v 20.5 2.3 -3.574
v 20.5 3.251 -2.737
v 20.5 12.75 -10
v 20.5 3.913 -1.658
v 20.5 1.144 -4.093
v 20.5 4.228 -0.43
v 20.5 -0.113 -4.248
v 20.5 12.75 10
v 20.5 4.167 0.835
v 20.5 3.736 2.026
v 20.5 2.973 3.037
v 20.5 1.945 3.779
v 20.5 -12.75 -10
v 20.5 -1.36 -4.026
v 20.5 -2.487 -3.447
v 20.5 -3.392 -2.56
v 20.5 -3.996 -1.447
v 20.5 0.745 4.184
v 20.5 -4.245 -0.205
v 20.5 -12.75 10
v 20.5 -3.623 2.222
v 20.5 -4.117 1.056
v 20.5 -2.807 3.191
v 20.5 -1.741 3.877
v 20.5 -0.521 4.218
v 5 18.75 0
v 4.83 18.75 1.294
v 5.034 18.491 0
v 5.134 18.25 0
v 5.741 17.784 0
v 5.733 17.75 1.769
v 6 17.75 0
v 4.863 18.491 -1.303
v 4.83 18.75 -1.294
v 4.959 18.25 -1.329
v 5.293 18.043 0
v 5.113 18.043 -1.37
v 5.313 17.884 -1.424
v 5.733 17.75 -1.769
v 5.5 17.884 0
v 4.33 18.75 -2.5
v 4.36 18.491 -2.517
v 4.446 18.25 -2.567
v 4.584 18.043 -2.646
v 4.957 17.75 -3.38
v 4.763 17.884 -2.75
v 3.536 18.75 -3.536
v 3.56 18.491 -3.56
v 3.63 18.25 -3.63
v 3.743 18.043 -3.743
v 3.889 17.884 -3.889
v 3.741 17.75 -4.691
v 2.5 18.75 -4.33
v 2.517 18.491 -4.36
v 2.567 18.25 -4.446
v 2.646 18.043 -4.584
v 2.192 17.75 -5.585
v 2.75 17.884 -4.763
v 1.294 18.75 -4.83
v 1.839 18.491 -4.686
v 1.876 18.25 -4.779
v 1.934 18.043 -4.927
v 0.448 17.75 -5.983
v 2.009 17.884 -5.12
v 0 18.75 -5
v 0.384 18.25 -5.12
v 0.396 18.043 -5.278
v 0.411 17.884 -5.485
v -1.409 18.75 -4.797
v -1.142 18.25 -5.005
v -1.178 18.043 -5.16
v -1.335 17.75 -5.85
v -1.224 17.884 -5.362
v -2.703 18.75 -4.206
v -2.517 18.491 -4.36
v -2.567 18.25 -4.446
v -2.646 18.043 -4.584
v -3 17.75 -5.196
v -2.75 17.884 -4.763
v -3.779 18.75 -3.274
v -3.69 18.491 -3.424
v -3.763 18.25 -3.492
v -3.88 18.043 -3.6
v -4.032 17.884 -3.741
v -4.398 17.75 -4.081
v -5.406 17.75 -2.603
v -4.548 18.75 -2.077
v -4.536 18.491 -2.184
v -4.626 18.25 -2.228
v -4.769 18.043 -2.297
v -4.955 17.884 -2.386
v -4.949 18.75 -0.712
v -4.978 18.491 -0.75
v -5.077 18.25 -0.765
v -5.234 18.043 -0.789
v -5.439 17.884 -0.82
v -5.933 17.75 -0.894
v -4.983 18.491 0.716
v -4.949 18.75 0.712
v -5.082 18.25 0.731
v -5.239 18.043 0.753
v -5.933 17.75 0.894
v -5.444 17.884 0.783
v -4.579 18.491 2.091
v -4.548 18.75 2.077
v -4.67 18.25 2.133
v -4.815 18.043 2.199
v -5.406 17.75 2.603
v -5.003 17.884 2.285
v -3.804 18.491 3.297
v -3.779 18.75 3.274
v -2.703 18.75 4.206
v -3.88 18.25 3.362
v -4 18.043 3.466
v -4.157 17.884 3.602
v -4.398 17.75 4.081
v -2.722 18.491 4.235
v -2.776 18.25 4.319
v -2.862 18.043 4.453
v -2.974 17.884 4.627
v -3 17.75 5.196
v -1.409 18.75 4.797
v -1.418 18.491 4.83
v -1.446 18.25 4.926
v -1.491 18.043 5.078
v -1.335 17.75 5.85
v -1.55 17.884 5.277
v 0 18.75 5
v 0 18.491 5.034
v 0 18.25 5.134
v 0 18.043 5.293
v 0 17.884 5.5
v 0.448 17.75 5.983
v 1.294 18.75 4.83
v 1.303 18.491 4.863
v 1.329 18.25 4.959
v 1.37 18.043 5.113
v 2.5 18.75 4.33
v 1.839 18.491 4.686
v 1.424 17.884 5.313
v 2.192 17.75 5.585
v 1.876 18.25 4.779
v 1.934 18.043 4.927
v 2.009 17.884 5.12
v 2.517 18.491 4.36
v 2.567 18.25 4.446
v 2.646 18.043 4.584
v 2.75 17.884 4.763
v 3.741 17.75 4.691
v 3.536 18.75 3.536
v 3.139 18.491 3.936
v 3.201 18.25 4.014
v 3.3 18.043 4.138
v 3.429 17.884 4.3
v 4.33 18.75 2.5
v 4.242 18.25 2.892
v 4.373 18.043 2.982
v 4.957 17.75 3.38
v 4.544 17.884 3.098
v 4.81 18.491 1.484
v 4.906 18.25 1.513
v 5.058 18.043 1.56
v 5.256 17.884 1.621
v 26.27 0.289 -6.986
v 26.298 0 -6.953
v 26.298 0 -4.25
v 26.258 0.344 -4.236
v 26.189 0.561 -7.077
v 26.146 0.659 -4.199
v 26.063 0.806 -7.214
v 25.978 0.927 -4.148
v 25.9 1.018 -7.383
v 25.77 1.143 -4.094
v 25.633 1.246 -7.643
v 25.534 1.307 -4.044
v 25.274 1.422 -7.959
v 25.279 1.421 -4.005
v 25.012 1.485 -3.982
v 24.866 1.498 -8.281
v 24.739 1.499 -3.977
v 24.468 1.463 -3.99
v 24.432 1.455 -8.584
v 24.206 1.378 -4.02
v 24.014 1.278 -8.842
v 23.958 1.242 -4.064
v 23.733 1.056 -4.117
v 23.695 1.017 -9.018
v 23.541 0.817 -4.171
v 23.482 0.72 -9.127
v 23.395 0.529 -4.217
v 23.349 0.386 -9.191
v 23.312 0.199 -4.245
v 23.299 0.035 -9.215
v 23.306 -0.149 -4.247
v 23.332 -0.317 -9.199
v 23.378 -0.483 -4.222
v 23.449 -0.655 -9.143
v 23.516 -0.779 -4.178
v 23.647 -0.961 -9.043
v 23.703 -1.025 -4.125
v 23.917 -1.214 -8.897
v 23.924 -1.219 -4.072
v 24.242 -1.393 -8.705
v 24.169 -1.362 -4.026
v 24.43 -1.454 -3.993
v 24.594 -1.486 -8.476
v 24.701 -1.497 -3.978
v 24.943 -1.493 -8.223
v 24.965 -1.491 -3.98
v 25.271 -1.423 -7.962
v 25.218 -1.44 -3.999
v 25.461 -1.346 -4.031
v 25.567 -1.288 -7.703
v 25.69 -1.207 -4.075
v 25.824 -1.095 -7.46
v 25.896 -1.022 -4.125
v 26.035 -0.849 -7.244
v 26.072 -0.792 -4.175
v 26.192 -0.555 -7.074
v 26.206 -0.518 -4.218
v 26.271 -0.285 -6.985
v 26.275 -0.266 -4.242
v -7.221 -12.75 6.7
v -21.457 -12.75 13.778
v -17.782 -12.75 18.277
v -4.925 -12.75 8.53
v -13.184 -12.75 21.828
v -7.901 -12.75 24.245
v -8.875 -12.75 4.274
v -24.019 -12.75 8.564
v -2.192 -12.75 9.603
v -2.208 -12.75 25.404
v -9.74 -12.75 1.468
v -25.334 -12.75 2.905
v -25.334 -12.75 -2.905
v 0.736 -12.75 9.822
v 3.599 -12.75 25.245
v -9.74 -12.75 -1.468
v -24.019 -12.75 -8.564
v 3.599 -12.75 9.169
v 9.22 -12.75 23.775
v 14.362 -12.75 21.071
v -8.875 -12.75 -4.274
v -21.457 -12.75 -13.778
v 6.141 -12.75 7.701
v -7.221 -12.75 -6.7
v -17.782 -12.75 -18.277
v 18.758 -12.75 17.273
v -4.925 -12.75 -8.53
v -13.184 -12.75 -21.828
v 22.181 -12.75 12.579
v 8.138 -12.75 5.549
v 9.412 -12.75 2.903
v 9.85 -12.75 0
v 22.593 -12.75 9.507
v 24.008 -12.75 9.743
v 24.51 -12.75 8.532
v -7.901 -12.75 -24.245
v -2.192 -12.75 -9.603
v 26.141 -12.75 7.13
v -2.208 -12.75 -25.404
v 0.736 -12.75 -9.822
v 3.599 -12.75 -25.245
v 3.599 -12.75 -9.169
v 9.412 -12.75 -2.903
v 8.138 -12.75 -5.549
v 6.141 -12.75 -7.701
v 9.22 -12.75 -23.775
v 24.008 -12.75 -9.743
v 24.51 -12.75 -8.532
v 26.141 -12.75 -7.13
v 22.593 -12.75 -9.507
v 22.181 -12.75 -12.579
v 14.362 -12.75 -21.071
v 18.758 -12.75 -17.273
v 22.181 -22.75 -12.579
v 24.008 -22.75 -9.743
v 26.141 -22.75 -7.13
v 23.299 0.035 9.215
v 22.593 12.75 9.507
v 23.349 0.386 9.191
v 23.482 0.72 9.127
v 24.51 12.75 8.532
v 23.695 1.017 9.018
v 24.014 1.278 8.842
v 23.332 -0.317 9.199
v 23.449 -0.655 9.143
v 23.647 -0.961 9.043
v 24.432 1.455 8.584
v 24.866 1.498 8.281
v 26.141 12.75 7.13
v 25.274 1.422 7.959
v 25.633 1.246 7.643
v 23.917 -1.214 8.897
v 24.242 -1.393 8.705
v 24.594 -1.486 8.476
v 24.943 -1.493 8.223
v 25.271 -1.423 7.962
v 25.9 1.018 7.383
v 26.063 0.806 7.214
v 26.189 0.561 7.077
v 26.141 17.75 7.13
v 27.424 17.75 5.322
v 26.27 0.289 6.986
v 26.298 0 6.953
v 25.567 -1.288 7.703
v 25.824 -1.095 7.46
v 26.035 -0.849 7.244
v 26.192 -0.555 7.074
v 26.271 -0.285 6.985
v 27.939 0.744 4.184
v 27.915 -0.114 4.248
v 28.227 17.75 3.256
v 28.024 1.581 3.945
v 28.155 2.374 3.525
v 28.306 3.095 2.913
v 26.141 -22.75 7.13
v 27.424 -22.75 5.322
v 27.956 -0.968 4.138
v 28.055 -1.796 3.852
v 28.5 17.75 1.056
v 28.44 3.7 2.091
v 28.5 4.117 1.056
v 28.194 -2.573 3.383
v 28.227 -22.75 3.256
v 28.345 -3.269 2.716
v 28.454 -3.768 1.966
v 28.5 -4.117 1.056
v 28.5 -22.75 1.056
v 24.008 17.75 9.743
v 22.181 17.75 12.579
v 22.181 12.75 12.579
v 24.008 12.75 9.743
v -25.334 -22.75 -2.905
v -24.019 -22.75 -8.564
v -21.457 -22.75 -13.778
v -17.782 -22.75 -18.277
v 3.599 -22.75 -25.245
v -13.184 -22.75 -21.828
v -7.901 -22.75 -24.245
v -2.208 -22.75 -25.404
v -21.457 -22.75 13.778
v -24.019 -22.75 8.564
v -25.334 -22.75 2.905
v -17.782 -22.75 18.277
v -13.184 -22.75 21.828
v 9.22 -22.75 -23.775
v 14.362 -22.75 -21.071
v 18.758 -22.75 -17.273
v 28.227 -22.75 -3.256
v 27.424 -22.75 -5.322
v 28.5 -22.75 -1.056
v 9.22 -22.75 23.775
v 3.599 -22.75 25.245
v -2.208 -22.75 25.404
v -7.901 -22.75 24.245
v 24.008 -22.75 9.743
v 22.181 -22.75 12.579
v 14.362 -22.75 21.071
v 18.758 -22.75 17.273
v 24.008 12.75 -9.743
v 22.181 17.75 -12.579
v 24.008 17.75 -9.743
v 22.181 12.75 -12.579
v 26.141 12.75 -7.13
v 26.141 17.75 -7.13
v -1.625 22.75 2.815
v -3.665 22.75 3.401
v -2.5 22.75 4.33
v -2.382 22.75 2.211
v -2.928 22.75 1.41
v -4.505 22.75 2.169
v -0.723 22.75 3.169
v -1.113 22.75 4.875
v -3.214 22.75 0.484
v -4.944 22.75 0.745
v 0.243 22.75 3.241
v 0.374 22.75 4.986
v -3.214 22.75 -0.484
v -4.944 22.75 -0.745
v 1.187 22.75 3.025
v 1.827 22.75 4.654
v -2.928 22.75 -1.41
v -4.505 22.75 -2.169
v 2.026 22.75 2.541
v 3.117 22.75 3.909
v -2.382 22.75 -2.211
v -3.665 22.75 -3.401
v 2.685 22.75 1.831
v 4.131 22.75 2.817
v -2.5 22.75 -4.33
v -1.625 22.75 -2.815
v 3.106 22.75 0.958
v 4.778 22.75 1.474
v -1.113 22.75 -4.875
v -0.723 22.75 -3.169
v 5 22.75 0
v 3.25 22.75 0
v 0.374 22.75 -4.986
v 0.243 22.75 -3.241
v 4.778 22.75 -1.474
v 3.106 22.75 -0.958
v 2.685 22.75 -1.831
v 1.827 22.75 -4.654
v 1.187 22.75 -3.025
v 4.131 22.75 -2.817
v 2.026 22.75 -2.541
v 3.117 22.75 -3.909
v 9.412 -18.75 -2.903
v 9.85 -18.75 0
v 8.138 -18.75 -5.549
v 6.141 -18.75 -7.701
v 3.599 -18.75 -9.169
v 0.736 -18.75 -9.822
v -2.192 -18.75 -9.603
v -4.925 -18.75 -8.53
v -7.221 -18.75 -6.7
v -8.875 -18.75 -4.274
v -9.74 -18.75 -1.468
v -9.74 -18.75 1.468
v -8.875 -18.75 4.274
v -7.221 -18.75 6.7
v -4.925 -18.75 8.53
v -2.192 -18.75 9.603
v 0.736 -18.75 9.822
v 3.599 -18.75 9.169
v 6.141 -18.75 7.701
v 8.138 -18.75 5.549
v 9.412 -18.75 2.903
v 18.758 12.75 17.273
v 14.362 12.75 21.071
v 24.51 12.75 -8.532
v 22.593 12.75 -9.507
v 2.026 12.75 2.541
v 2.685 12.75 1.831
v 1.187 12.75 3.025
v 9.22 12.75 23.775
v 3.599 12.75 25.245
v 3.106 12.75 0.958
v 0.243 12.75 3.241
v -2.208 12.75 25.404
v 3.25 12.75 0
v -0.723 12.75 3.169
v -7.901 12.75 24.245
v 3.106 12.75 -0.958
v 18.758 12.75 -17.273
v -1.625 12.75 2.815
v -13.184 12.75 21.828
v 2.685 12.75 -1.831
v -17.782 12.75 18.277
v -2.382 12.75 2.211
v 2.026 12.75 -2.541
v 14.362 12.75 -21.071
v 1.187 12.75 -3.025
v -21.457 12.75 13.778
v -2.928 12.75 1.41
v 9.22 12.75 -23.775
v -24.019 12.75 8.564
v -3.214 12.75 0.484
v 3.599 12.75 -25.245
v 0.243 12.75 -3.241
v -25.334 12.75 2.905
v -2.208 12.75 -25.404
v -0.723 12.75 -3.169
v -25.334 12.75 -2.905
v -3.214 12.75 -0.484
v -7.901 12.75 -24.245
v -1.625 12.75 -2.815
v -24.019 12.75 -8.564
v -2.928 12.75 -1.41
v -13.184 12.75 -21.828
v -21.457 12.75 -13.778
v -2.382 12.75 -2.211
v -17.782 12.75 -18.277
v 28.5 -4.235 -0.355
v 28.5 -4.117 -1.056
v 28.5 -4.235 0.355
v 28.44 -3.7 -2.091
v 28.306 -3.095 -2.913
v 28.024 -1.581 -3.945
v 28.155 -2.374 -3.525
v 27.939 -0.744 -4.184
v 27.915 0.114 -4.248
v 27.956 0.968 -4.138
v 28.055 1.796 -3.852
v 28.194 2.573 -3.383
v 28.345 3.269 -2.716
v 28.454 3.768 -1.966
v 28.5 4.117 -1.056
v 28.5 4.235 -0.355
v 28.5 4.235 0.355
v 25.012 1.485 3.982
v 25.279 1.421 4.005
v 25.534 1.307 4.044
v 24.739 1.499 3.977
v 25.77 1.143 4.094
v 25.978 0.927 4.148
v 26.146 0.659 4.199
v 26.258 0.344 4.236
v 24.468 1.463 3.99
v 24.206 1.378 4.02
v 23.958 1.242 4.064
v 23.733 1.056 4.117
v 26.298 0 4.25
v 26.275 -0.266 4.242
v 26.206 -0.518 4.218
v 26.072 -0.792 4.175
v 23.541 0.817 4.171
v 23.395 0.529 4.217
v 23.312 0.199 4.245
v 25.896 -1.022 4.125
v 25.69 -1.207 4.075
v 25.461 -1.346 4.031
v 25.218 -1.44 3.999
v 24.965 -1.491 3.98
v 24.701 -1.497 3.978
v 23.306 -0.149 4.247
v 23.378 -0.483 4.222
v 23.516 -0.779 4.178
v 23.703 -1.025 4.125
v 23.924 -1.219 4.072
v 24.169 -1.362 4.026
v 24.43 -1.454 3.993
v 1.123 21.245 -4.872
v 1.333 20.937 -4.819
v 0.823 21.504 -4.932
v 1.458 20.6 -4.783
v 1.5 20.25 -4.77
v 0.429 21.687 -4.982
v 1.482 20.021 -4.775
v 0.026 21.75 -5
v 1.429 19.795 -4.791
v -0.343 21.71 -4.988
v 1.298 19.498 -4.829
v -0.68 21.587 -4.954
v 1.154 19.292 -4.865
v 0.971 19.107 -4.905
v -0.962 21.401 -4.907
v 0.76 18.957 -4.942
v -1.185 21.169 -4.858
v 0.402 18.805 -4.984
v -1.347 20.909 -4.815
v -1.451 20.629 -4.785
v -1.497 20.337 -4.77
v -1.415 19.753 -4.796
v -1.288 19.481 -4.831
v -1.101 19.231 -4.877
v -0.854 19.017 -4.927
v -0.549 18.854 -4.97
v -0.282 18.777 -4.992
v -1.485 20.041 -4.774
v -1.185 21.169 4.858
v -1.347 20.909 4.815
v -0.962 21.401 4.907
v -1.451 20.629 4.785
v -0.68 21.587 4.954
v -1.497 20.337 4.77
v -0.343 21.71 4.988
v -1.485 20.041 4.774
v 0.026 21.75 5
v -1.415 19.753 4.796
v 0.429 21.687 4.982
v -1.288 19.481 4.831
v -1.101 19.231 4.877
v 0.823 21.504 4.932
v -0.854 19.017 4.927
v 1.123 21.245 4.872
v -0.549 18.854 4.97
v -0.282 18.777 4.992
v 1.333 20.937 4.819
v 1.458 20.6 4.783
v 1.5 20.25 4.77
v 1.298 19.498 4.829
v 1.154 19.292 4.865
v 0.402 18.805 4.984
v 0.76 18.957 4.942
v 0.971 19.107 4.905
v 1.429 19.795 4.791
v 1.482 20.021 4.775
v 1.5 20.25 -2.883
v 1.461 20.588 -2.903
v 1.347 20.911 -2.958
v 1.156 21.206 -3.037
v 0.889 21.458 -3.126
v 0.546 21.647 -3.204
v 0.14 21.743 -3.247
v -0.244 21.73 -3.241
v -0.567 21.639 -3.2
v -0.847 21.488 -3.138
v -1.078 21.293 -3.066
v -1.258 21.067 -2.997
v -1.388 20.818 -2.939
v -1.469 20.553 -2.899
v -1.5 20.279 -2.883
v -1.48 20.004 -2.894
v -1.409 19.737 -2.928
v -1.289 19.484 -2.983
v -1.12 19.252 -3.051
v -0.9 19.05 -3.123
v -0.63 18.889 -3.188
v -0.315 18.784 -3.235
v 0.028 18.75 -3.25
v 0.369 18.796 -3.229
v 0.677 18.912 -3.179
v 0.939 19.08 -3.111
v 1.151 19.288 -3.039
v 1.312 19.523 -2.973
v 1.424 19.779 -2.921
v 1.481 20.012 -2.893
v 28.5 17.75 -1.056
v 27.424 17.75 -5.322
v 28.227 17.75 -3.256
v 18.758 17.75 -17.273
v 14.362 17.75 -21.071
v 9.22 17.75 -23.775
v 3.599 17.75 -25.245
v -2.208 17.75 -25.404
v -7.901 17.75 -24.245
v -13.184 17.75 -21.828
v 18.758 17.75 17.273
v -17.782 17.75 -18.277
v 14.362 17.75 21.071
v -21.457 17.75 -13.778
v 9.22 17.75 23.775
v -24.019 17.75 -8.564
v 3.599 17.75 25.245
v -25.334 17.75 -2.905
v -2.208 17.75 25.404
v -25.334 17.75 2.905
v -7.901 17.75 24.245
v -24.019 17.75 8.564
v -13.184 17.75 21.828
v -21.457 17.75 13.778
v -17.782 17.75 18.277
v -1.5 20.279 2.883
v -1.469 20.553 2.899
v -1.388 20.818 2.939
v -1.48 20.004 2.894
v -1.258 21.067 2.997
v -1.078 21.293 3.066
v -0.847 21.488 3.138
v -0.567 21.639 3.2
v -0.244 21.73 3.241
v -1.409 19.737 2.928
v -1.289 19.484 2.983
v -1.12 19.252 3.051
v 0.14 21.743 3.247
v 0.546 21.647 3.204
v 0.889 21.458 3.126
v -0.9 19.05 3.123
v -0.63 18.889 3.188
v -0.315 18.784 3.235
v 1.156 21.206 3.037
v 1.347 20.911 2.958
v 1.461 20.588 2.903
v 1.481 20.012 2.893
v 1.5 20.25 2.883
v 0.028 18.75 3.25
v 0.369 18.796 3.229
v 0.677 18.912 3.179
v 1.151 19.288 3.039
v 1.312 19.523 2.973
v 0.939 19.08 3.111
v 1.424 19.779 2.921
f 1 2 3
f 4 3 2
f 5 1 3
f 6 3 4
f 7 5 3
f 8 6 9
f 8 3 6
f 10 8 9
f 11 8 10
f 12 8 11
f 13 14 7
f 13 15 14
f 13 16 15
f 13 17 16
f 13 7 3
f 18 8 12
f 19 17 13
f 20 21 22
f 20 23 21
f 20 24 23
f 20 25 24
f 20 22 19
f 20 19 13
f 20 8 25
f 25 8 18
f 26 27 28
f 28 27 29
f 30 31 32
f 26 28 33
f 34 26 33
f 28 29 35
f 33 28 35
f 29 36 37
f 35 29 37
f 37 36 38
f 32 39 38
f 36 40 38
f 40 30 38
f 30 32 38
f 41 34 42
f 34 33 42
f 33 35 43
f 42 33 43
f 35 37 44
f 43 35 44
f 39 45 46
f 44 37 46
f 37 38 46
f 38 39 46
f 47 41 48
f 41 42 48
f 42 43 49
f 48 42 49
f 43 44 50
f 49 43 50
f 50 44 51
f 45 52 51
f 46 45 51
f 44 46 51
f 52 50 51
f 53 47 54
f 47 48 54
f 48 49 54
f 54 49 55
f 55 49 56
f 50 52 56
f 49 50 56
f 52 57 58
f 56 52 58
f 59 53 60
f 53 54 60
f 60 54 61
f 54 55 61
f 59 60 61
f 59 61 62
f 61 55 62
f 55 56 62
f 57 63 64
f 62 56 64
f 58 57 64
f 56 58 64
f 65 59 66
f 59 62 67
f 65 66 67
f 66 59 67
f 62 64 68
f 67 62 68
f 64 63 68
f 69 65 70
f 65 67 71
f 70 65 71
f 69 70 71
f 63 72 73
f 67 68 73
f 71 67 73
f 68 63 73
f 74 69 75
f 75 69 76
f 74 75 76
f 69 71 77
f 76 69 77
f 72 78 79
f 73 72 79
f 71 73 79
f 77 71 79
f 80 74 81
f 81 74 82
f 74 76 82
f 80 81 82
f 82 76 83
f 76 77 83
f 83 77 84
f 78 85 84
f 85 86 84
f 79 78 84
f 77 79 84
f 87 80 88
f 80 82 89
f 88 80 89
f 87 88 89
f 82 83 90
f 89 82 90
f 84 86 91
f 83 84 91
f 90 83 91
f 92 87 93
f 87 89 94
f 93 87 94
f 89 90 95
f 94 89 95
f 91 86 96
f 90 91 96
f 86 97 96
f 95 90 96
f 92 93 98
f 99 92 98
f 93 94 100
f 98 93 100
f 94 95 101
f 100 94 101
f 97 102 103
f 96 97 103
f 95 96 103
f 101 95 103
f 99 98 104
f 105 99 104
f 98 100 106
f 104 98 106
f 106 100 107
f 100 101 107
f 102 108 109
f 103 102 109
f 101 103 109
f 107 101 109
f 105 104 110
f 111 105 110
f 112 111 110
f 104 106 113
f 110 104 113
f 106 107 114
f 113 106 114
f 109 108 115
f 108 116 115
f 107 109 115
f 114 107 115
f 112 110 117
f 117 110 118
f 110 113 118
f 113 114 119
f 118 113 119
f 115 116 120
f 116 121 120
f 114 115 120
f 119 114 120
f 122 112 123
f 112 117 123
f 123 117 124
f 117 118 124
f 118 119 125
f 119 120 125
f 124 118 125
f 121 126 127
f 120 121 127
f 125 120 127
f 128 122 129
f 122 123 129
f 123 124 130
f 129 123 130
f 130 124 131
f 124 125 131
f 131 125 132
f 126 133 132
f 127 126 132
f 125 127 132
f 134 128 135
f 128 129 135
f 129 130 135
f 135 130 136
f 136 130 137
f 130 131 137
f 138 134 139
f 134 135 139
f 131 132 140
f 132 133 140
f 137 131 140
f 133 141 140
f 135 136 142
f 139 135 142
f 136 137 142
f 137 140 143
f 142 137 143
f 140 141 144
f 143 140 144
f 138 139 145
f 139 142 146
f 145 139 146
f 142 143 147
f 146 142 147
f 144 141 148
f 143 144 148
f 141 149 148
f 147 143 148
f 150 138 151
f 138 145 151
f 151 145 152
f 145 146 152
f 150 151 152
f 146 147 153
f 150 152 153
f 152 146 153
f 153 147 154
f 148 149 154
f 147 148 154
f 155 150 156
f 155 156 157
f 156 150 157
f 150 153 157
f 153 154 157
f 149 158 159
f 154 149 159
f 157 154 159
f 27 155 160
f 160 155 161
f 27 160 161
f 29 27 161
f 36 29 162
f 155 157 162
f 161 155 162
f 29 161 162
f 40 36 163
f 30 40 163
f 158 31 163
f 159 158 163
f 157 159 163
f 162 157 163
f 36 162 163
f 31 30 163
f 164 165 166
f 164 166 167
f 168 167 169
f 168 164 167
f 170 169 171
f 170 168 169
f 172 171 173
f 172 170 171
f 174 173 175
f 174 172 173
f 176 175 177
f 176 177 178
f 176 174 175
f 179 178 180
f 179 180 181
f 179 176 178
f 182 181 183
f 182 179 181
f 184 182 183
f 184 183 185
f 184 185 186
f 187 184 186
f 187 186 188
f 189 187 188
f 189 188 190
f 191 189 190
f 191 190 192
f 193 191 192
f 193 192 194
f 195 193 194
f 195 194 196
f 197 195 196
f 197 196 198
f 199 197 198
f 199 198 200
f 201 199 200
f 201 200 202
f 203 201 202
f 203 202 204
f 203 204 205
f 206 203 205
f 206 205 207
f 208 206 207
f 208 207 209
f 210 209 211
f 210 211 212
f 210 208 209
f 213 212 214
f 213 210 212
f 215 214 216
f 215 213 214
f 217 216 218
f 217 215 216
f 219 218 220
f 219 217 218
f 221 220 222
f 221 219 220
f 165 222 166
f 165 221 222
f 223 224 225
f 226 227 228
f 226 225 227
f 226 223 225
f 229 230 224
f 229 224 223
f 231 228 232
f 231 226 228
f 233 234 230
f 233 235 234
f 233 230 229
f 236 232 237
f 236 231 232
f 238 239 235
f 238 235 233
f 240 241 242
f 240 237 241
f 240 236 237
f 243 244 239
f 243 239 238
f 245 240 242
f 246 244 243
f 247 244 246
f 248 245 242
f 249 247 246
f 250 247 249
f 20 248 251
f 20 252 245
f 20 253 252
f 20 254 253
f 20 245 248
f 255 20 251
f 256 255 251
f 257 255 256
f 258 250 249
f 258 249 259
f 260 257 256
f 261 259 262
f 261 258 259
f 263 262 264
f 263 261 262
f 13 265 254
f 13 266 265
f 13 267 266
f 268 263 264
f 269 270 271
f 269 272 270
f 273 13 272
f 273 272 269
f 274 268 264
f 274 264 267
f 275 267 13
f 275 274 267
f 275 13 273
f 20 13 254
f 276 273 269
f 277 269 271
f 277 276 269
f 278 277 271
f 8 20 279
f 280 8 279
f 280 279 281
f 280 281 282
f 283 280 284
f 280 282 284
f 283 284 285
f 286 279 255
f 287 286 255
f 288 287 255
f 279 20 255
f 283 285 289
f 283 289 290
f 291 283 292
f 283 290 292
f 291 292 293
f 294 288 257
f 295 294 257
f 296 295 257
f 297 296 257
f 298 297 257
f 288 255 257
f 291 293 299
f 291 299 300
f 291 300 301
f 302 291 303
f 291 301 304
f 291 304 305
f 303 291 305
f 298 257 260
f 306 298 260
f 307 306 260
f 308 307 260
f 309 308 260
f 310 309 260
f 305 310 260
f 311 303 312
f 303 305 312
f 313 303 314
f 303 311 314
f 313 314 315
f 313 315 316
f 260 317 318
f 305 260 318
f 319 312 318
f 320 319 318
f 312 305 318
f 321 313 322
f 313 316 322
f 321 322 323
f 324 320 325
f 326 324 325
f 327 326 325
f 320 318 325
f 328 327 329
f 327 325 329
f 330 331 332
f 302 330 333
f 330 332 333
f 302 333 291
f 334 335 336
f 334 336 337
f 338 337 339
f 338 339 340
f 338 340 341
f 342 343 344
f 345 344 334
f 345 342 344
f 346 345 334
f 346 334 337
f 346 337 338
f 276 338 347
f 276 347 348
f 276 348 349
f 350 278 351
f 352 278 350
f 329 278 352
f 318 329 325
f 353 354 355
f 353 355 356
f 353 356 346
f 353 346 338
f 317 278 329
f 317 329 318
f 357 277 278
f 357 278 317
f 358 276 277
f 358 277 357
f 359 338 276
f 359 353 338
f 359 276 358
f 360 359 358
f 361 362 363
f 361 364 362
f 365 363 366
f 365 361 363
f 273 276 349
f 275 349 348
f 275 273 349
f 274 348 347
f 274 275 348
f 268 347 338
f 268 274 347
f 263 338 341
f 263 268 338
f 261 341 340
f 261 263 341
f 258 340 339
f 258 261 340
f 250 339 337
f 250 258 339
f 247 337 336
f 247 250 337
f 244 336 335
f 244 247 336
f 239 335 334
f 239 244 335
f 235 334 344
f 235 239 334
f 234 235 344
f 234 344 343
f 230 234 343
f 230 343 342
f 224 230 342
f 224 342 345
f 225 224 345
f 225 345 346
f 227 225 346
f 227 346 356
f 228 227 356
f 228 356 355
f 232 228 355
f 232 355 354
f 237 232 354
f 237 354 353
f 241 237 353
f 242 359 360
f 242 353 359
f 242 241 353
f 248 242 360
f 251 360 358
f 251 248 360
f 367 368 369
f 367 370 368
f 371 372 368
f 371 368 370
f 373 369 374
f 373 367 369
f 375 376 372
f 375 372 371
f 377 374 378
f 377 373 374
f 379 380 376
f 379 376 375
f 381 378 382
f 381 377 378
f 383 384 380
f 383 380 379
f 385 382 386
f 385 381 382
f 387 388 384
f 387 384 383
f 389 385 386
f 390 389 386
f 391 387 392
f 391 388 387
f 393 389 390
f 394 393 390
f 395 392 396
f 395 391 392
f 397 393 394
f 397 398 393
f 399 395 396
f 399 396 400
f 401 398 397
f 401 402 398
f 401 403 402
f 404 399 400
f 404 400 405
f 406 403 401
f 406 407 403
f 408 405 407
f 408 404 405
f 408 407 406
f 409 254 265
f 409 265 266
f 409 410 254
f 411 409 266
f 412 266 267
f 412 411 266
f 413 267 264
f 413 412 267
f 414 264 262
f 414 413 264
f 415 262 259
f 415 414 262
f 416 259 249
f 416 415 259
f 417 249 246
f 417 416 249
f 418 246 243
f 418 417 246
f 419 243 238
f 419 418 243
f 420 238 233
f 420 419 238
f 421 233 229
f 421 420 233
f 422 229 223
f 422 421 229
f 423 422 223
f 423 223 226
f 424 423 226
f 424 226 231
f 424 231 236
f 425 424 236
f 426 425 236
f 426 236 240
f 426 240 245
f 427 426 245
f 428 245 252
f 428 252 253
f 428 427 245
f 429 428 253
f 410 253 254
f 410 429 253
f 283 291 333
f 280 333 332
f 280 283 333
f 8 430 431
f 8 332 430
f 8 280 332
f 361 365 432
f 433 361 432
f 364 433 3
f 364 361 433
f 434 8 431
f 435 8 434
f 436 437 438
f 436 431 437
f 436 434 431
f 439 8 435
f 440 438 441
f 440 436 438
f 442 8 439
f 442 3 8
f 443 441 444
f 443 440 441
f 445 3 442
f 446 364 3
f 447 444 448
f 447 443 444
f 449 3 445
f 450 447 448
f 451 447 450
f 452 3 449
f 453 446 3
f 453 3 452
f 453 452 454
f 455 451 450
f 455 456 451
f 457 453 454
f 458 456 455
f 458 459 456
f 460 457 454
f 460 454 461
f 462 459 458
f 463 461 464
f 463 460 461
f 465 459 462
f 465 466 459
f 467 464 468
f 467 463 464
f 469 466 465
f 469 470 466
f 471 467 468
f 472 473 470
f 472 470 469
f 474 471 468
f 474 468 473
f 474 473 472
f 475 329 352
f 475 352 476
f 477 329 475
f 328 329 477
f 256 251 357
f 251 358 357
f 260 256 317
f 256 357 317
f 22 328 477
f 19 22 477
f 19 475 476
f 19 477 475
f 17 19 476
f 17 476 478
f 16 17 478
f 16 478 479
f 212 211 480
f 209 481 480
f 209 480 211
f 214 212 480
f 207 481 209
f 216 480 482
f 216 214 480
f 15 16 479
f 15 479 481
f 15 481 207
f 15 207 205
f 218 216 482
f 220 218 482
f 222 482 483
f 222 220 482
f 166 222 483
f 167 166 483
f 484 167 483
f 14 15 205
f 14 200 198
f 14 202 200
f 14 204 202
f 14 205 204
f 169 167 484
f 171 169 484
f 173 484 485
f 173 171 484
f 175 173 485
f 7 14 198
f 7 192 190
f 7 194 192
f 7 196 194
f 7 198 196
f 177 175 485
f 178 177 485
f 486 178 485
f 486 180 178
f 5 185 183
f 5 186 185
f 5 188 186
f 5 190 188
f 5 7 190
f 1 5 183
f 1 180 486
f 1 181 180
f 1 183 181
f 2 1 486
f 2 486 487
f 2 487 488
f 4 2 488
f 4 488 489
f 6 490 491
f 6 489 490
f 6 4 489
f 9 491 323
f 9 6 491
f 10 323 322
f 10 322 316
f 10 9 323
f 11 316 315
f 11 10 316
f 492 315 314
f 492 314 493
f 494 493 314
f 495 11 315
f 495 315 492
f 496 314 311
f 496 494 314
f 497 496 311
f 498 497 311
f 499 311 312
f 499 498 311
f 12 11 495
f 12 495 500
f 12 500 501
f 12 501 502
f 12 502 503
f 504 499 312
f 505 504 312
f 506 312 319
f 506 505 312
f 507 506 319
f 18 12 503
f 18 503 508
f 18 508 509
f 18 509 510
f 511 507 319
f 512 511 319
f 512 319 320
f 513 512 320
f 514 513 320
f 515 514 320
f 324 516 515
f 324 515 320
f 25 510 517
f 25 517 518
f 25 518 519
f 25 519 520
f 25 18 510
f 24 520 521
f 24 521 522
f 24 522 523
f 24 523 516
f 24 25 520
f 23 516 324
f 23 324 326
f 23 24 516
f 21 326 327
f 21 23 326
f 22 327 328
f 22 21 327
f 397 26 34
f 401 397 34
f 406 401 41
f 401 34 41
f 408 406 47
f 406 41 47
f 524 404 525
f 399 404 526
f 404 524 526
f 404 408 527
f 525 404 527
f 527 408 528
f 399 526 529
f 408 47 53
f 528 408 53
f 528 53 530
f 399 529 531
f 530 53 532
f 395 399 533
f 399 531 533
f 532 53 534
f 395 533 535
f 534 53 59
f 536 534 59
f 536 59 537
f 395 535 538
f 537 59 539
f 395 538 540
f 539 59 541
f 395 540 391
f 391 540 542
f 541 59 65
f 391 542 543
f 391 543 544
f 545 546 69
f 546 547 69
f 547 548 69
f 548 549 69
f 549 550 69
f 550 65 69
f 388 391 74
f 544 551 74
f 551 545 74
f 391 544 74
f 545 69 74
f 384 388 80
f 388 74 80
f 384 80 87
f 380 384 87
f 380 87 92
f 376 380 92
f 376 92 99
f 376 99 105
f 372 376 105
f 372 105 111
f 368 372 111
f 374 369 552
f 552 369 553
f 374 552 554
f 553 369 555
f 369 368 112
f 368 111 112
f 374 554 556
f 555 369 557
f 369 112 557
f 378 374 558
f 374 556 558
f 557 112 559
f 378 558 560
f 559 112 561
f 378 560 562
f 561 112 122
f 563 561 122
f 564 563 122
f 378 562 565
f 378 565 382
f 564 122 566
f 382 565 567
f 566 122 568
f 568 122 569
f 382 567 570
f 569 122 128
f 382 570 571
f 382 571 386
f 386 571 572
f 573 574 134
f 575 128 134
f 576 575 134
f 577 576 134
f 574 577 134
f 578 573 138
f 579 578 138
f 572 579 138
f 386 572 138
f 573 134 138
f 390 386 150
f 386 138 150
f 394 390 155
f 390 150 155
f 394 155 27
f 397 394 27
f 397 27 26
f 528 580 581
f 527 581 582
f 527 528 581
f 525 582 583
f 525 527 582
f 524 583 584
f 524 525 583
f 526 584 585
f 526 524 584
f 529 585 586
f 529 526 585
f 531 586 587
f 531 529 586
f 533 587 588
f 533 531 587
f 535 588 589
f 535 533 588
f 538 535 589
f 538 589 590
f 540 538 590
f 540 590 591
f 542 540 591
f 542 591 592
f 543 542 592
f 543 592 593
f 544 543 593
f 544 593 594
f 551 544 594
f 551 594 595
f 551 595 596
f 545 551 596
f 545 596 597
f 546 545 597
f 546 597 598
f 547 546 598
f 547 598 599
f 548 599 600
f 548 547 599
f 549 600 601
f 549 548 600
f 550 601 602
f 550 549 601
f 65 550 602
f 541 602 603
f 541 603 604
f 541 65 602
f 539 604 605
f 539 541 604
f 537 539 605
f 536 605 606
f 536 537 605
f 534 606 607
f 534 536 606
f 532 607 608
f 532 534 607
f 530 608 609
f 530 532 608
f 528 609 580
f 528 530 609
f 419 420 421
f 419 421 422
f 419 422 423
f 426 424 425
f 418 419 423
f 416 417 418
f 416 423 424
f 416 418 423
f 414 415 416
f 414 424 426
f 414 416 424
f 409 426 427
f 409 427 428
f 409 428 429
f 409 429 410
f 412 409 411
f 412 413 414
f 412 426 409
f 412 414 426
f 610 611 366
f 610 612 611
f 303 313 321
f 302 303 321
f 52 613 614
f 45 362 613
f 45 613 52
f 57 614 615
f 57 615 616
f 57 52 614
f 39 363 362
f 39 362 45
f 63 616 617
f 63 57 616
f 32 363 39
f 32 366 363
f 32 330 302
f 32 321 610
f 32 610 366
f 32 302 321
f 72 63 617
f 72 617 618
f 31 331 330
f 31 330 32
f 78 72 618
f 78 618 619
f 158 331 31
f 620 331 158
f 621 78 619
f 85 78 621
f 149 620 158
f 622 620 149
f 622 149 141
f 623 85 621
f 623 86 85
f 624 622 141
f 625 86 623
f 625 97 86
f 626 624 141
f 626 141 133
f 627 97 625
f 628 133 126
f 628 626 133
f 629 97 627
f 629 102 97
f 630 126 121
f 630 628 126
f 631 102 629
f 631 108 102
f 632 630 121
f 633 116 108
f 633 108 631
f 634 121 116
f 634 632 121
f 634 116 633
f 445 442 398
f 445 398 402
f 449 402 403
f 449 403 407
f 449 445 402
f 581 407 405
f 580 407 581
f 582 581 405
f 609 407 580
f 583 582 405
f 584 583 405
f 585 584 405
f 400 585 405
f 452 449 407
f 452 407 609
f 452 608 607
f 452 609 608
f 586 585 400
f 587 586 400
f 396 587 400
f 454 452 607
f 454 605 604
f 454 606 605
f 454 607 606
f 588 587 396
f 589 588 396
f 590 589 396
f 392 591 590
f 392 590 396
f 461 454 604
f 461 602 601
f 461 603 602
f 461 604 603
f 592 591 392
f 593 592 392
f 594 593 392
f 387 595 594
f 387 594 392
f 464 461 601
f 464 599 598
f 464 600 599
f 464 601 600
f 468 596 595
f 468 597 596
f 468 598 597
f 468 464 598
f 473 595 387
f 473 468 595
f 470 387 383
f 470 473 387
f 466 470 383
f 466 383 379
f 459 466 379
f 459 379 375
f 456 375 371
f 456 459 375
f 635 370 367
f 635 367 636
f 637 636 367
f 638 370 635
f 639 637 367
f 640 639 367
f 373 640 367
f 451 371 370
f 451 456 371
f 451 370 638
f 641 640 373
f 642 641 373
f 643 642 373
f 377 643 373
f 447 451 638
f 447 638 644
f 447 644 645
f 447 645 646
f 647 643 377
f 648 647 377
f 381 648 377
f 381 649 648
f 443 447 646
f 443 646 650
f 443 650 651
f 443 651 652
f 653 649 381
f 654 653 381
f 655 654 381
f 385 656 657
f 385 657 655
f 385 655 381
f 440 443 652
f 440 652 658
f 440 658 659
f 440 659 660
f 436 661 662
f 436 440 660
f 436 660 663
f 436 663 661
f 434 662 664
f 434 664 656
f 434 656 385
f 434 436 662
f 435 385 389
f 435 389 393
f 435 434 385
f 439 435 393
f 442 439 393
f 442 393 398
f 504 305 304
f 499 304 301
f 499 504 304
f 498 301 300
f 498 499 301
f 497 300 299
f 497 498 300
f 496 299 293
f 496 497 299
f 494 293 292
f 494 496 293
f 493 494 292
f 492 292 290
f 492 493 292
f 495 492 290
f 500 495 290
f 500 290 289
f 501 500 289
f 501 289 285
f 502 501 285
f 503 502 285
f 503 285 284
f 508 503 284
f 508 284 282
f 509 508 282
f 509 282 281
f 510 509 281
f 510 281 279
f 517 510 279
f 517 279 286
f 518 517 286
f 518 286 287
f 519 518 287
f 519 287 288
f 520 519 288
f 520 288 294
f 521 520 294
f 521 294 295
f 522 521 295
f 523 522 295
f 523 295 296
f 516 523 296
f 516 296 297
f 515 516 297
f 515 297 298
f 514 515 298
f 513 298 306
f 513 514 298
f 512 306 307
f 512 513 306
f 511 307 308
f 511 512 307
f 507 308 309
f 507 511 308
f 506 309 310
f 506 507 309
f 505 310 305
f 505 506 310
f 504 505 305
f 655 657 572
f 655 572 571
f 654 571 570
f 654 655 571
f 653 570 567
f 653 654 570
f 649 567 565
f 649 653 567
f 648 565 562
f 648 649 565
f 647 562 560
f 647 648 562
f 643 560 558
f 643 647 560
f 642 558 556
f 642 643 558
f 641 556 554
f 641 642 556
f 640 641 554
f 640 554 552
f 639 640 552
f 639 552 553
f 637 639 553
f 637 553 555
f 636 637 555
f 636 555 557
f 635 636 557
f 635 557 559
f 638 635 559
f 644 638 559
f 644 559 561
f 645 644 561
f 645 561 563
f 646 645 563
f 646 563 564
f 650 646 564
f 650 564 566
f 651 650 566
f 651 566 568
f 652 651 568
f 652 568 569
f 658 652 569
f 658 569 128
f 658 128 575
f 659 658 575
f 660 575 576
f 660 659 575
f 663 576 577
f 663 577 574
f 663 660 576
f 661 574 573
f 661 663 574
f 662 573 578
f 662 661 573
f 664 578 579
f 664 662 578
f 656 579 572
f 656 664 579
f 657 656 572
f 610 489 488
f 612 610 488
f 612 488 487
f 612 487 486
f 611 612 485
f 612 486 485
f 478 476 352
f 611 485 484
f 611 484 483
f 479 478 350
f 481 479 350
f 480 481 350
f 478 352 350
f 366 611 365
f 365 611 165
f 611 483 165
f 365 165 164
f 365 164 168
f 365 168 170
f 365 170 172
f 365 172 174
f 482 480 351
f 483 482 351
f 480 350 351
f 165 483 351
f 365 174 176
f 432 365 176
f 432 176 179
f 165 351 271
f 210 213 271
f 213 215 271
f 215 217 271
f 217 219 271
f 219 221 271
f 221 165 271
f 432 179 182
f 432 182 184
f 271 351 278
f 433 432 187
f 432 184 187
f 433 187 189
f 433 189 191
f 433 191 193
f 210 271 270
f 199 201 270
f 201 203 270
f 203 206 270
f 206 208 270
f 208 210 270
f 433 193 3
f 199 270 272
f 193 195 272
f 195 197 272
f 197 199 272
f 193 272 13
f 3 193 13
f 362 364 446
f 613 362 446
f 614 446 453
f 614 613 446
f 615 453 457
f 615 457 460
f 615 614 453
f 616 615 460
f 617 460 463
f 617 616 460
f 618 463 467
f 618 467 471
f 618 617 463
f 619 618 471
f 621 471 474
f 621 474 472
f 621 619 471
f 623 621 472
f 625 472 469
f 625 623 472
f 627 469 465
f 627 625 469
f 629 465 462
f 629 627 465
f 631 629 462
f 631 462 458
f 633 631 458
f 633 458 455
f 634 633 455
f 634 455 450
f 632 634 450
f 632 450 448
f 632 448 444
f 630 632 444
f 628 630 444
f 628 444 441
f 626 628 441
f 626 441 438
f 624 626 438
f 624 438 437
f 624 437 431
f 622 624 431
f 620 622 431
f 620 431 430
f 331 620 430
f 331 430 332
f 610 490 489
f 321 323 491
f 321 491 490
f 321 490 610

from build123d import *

# Parameters (mm, degrees)
SKETCH1_W               = 22.25
SKETCH1_H               = 5
BOSS_EXTRUDE1_DEPTH     = 10
FILLET2_R               = 9
FILLET4_R               = 30
SKETCH4_R               = 4.25
CUT_EXTRUDE1_DEPTH      = 74
CUT_EXTRUDE3_DEPTH      = 45.497893381
CUT_EXTRUDE3_DEPTH_BACK = 45.497893381
SKETCH6_R               = 1.5
SKETCH7_R               = 5
SKETCH7_R_2             = 3.25
BOSS_EXTRUDE2_DEPTH     = 5
FILLET6_R               = 1
CUT_EXTRUDE4_DEPTH      = 45.497893381
CUT_EXTRUDE4_DEPTH_BACK = 45.497893381
SKETCH8_R               = 1.5


with BuildPart() as part:
    # Sketch1 → Revolve1 (revolve)
    with BuildSketch(Plane.XY):
        Polygon((25.5, -22.75), (25.5, -12.75), (9.85, -12.75), (9.85, -18.75), (0, -18.75), (0, -22.75), align=None)
        with Locations((14.375, 15.25)):
            Rectangle(SKETCH1_W, SKETCH1_H)
    revolve(axis=Axis((0, -12.75, 0), (0, 1, 0)))


with BuildPart() as body_2:
    # Sketch2 → Boss-Extrude1 (new, symmetric)
    with BuildSketch(Plane.XY):
        Polygon((25.5, -22.75), (28.5, -22.75), (28.5, 17.75), (25.5, 17.75), (20.5, 17.75), (20.5, -22.75), align=None)
    extrude(amount=BOSS_EXTRUDE1_DEPTH, both=True)


with BuildPart() as part_1:
    add(part.part)

    # Intersect2: read off the stored shape, not the designer's step
    # Intersect2: union body 2
    add(body_2.part)

    # Fillet2
    # the kernel refuses this fillet: 9 mm, written as the material it takes off along each edge
    with BuildSketch(Plane(origin=(28.5, -45.110679775, -10), x_dir=(-1, 0, 0), z_dir=(0, 1, 0))) as fillet2_piece_1_section:
        with BuildLine():
            CenterArc((9, 8.94427191), FILLET2_R, 180, 83.620629792)
            Line((0, 8.94427191), (0, 0))
            Line((0, 0), (8, 0))
        make_face()
    fillet2_piece_1 = extrude(amount=85.22135955, mode=Mode.PRIVATE)
    fillet2_piece_1 = fillet2_piece_1 - Plane(origin=(0, -45.110679775, 0), x_dir=(1, 0, 0), z_dir=(0, 1, 0)) * Cylinder(25.5, 207, mode=Mode.PRIVATE)
    add(fillet2_piece_1, mode=Mode.SUBTRACT)
    with BuildSketch(Plane(origin=(28.5, -45.110679775, -10), x_dir=(-1, 0, 0), z_dir=(0, 1, 0))) as fillet2_piece_2_section:
        with BuildLine():
            CenterArc((9, 8.94427191), FILLET2_R, 180, 83.620629792)
            Line((0, 8.94427191), (0, 0))
            Line((0, 0), (8, 0))
        make_face()
    fillet2_piece_2 = extrude(amount=85.22135955, mode=Mode.PRIVATE)
    fillet2_piece_2 = split(fillet2_piece_2, bisect_by=Plane(origin=(28.5, -12.75, -10), z_dir=(0, 1, 0)), keep=Keep.TOP, mode=Mode.PRIVATE)
    fillet2_piece_2 = split(fillet2_piece_2, bisect_by=Plane(origin=(28.5, 12.75, -10), z_dir=(0, -1, 0)), keep=Keep.TOP, mode=Mode.PRIVATE)
    add(fillet2_piece_2, mode=Mode.SUBTRACT)
    with BuildSketch(Plane(origin=(28.5, -45.110679775, 10), x_dir=(-1, 0, 0), z_dir=(0, 1, 0))) as fillet2_piece_3_section:
        with BuildLine():
            CenterArc((9, -8.94427191), FILLET2_R, 96.379370208, 83.620629792)
            Line((0, -8.94427191), (0, 0))
            Line((0, 0), (8, 0))
        make_face()
    fillet2_piece_3 = extrude(amount=85.22135955, mode=Mode.PRIVATE)
    fillet2_piece_3 = fillet2_piece_3 - Plane(origin=(0, -45.110679775, 0), x_dir=(1, 0, 0), z_dir=(0, 1, 0)) * Cylinder(25.5, 207, mode=Mode.PRIVATE)
    add(fillet2_piece_3, mode=Mode.SUBTRACT)
    with BuildSketch(Plane(origin=(28.5, -45.110679775, 10), x_dir=(-1, 0, 0), z_dir=(0, 1, 0))) as fillet2_piece_4_section:
        with BuildLine():
            CenterArc((9, -8.94427191), FILLET2_R, 96.379370208, 83.620629792)
            Line((0, -8.94427191), (0, 0))
            Line((0, 0), (8, 0))
        make_face()
    fillet2_piece_4 = extrude(amount=85.22135955, mode=Mode.PRIVATE)
    fillet2_piece_4 = split(fillet2_piece_4, bisect_by=Plane(origin=(28.5, -12.75, 10), z_dir=(0, 1, 0)), keep=Keep.TOP, mode=Mode.PRIVATE)
    fillet2_piece_4 = split(fillet2_piece_4, bisect_by=Plane(origin=(28.5, 12.75, 10), z_dir=(0, -1, 0)), keep=Keep.TOP, mode=Mode.PRIVATE)
    add(fillet2_piece_4, mode=Mode.SUBTRACT)

    # Fillet4
    fillet4_edges = [part_1.edges().sort_by_distance(p)[0] for p in [
        (23.892282884, 15.25, -8.911162582),
        (23.892282884, -17.75, -8.911162582),
        (23.892282884, 15.25, 8.911162582),
        (23.892282884, -17.75, 8.911162582),
    ]]
    fillet(fillet4_edges, radius=FILLET4_R)

    # Sketch4 → Cut-Extrude1 (cut)
    with BuildSketch(Plane(origin=(0, 0, 0), x_dir=(0, 0, -1), z_dir=(1, 0, 0))):
        with Locations(Location((0, 0, 0), (0, 0, 255.616756445))):
            Circle(SKETCH4_R)
    extrude(amount=CUT_EXTRUDE1_DEPTH, mode=Mode.SUBTRACT)

    # Sketch6 → Cut-Extrude3 (cut, two sides: drawn at the far end of the back side and taken through both)
    with BuildSketch(Plane.XY.offset(-CUT_EXTRUDE3_DEPTH_BACK)):
        with Locations((24.798321038, 0)):
            Circle(SKETCH6_R)
    extrude(amount=CUT_EXTRUDE3_DEPTH + CUT_EXTRUDE3_DEPTH_BACK, mode=Mode.SUBTRACT)

    # Sketch7 → Boss-Extrude2 (add)
    with BuildSketch(Plane(origin=(0, 17.75, 0), x_dir=(1, 0, 0), z_dir=(0, 1, 0))):
        Circle(SKETCH7_R)
        Circle(SKETCH7_R_2, mode=Mode.SUBTRACT)
    extrude(amount=BOSS_EXTRUDE2_DEPTH)

    # Fillet6
    fillet6_edges = [part_1.edges().sort_by_distance(p)[0] for p in [
        (-5, 17.75, 0),
    ]]
    fillet(fillet6_edges, radius=FILLET6_R)

    # Sketch8 → Cut-Extrude4 (cut, two sides: drawn at the far end of the back side and taken through both)
    with BuildSketch(Plane.XY.offset(-CUT_EXTRUDE4_DEPTH_BACK)):
        with Locations((0, 20.25)):
            Circle(SKETCH8_R)
    extrude(amount=CUT_EXTRUDE4_DEPTH + CUT_EXTRUDE4_DEPTH_BACK, mode=Mode.SUBTRACT)


solid = part_1.part
